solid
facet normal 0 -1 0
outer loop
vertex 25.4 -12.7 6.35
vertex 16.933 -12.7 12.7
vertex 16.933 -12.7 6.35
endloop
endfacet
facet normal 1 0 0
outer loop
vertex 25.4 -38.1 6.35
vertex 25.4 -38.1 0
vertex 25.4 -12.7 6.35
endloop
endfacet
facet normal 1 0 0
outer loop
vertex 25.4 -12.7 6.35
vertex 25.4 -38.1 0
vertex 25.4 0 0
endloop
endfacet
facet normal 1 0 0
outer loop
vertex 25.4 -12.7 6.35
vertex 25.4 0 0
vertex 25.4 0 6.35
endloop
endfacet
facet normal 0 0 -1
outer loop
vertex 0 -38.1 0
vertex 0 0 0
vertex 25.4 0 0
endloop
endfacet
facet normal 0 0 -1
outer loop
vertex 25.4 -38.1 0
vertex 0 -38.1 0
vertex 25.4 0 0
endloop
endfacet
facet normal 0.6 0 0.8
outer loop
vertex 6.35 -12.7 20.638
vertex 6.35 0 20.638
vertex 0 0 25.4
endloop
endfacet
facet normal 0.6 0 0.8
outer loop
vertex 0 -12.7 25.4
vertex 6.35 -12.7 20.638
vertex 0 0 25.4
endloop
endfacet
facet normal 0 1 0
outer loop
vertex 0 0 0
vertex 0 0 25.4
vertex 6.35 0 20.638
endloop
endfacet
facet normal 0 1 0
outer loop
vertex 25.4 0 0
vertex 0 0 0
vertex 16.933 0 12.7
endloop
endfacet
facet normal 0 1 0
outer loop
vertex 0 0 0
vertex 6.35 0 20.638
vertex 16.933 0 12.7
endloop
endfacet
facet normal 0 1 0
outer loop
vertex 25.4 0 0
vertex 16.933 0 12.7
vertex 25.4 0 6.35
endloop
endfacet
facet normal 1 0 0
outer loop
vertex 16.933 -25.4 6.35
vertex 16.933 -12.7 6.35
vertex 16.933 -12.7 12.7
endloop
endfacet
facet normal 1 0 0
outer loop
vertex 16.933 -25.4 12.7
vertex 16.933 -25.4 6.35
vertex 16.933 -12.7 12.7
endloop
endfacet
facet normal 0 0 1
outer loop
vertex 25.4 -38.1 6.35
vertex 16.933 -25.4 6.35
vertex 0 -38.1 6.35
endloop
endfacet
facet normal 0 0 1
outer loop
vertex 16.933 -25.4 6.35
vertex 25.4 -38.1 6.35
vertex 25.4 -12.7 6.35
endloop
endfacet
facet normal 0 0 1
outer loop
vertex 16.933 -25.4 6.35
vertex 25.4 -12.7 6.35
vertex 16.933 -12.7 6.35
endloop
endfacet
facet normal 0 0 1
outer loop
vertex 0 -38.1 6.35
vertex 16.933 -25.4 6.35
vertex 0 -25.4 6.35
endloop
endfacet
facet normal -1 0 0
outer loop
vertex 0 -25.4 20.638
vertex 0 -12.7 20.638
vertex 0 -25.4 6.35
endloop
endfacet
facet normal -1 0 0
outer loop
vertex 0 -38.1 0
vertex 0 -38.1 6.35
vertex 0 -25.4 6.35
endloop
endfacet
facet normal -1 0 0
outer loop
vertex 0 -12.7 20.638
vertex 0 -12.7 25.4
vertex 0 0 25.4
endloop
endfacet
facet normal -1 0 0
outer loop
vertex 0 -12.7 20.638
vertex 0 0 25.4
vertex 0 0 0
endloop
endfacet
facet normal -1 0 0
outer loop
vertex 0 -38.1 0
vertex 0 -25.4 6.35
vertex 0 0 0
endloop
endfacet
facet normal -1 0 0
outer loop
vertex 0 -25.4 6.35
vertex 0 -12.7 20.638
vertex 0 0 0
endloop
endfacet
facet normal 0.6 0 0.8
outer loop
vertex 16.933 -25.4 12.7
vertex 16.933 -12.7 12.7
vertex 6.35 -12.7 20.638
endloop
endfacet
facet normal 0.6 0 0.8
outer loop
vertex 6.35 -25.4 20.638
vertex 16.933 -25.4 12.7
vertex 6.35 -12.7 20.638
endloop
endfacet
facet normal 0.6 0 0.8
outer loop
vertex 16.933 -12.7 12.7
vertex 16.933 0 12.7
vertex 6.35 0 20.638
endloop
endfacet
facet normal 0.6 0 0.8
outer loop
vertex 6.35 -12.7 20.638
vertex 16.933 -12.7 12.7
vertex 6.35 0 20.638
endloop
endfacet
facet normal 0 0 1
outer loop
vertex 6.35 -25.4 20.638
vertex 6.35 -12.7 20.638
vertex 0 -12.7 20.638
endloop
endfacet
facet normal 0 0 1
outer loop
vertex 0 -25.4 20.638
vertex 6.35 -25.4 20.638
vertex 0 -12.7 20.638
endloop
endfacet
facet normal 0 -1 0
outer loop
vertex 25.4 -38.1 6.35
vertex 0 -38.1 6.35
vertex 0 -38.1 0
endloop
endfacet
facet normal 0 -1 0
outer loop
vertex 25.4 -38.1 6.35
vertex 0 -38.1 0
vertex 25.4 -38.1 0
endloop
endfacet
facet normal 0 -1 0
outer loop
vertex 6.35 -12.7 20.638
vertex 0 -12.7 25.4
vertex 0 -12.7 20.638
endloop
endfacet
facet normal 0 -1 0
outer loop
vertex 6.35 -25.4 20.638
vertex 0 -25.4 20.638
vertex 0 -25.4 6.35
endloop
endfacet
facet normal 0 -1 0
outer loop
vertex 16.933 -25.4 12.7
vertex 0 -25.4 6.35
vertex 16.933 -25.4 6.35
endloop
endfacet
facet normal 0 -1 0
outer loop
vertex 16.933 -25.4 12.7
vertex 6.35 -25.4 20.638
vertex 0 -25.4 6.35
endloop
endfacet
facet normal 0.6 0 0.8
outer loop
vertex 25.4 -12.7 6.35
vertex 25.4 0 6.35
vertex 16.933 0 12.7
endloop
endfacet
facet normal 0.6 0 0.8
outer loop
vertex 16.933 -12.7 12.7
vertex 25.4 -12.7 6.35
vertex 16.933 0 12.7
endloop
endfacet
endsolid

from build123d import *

# Parameters (mm, degrees)
F1_DEPTH = 38.1
F2_DEPTH = 25.4
F3_DEPTH = 12.7
F4_DEPTH = 12.7


with BuildPart() as f1:
    # F0 (on Front) → F1 (new body)
    with BuildSketch(Plane.XZ):
        Polygon((0, 6.35), (0, 0), (25.4, 0), (25.4, 6.35), (16.933333, 6.35), align=None)
    extrude(amount=F1_DEPTH)

    # F0 (on Front) → F2 (join)
    with BuildSketch(Plane.XZ):
        Polygon((0, 20.6375), (0, 6.35), (16.933333, 6.35), (16.933333, 12.7), (6.35, 20.6375), align=None)
    extrude(amount=F2_DEPTH)

    # F0 (on Front) → F3 (join)
    with BuildSketch(Plane.XZ):
        Polygon((0, 25.4), (0, 20.6375), (6.35, 20.6375), align=None)
    extrude(amount=F3_DEPTH)

    # F0 (on Front) → F4 (join)
    with BuildSketch(Plane.XZ):
        Polygon((16.933333, 12.7), (16.933333, 6.35), (25.4, 6.35), align=None)
    extrude(amount=F4_DEPTH)


solid = f1.part
